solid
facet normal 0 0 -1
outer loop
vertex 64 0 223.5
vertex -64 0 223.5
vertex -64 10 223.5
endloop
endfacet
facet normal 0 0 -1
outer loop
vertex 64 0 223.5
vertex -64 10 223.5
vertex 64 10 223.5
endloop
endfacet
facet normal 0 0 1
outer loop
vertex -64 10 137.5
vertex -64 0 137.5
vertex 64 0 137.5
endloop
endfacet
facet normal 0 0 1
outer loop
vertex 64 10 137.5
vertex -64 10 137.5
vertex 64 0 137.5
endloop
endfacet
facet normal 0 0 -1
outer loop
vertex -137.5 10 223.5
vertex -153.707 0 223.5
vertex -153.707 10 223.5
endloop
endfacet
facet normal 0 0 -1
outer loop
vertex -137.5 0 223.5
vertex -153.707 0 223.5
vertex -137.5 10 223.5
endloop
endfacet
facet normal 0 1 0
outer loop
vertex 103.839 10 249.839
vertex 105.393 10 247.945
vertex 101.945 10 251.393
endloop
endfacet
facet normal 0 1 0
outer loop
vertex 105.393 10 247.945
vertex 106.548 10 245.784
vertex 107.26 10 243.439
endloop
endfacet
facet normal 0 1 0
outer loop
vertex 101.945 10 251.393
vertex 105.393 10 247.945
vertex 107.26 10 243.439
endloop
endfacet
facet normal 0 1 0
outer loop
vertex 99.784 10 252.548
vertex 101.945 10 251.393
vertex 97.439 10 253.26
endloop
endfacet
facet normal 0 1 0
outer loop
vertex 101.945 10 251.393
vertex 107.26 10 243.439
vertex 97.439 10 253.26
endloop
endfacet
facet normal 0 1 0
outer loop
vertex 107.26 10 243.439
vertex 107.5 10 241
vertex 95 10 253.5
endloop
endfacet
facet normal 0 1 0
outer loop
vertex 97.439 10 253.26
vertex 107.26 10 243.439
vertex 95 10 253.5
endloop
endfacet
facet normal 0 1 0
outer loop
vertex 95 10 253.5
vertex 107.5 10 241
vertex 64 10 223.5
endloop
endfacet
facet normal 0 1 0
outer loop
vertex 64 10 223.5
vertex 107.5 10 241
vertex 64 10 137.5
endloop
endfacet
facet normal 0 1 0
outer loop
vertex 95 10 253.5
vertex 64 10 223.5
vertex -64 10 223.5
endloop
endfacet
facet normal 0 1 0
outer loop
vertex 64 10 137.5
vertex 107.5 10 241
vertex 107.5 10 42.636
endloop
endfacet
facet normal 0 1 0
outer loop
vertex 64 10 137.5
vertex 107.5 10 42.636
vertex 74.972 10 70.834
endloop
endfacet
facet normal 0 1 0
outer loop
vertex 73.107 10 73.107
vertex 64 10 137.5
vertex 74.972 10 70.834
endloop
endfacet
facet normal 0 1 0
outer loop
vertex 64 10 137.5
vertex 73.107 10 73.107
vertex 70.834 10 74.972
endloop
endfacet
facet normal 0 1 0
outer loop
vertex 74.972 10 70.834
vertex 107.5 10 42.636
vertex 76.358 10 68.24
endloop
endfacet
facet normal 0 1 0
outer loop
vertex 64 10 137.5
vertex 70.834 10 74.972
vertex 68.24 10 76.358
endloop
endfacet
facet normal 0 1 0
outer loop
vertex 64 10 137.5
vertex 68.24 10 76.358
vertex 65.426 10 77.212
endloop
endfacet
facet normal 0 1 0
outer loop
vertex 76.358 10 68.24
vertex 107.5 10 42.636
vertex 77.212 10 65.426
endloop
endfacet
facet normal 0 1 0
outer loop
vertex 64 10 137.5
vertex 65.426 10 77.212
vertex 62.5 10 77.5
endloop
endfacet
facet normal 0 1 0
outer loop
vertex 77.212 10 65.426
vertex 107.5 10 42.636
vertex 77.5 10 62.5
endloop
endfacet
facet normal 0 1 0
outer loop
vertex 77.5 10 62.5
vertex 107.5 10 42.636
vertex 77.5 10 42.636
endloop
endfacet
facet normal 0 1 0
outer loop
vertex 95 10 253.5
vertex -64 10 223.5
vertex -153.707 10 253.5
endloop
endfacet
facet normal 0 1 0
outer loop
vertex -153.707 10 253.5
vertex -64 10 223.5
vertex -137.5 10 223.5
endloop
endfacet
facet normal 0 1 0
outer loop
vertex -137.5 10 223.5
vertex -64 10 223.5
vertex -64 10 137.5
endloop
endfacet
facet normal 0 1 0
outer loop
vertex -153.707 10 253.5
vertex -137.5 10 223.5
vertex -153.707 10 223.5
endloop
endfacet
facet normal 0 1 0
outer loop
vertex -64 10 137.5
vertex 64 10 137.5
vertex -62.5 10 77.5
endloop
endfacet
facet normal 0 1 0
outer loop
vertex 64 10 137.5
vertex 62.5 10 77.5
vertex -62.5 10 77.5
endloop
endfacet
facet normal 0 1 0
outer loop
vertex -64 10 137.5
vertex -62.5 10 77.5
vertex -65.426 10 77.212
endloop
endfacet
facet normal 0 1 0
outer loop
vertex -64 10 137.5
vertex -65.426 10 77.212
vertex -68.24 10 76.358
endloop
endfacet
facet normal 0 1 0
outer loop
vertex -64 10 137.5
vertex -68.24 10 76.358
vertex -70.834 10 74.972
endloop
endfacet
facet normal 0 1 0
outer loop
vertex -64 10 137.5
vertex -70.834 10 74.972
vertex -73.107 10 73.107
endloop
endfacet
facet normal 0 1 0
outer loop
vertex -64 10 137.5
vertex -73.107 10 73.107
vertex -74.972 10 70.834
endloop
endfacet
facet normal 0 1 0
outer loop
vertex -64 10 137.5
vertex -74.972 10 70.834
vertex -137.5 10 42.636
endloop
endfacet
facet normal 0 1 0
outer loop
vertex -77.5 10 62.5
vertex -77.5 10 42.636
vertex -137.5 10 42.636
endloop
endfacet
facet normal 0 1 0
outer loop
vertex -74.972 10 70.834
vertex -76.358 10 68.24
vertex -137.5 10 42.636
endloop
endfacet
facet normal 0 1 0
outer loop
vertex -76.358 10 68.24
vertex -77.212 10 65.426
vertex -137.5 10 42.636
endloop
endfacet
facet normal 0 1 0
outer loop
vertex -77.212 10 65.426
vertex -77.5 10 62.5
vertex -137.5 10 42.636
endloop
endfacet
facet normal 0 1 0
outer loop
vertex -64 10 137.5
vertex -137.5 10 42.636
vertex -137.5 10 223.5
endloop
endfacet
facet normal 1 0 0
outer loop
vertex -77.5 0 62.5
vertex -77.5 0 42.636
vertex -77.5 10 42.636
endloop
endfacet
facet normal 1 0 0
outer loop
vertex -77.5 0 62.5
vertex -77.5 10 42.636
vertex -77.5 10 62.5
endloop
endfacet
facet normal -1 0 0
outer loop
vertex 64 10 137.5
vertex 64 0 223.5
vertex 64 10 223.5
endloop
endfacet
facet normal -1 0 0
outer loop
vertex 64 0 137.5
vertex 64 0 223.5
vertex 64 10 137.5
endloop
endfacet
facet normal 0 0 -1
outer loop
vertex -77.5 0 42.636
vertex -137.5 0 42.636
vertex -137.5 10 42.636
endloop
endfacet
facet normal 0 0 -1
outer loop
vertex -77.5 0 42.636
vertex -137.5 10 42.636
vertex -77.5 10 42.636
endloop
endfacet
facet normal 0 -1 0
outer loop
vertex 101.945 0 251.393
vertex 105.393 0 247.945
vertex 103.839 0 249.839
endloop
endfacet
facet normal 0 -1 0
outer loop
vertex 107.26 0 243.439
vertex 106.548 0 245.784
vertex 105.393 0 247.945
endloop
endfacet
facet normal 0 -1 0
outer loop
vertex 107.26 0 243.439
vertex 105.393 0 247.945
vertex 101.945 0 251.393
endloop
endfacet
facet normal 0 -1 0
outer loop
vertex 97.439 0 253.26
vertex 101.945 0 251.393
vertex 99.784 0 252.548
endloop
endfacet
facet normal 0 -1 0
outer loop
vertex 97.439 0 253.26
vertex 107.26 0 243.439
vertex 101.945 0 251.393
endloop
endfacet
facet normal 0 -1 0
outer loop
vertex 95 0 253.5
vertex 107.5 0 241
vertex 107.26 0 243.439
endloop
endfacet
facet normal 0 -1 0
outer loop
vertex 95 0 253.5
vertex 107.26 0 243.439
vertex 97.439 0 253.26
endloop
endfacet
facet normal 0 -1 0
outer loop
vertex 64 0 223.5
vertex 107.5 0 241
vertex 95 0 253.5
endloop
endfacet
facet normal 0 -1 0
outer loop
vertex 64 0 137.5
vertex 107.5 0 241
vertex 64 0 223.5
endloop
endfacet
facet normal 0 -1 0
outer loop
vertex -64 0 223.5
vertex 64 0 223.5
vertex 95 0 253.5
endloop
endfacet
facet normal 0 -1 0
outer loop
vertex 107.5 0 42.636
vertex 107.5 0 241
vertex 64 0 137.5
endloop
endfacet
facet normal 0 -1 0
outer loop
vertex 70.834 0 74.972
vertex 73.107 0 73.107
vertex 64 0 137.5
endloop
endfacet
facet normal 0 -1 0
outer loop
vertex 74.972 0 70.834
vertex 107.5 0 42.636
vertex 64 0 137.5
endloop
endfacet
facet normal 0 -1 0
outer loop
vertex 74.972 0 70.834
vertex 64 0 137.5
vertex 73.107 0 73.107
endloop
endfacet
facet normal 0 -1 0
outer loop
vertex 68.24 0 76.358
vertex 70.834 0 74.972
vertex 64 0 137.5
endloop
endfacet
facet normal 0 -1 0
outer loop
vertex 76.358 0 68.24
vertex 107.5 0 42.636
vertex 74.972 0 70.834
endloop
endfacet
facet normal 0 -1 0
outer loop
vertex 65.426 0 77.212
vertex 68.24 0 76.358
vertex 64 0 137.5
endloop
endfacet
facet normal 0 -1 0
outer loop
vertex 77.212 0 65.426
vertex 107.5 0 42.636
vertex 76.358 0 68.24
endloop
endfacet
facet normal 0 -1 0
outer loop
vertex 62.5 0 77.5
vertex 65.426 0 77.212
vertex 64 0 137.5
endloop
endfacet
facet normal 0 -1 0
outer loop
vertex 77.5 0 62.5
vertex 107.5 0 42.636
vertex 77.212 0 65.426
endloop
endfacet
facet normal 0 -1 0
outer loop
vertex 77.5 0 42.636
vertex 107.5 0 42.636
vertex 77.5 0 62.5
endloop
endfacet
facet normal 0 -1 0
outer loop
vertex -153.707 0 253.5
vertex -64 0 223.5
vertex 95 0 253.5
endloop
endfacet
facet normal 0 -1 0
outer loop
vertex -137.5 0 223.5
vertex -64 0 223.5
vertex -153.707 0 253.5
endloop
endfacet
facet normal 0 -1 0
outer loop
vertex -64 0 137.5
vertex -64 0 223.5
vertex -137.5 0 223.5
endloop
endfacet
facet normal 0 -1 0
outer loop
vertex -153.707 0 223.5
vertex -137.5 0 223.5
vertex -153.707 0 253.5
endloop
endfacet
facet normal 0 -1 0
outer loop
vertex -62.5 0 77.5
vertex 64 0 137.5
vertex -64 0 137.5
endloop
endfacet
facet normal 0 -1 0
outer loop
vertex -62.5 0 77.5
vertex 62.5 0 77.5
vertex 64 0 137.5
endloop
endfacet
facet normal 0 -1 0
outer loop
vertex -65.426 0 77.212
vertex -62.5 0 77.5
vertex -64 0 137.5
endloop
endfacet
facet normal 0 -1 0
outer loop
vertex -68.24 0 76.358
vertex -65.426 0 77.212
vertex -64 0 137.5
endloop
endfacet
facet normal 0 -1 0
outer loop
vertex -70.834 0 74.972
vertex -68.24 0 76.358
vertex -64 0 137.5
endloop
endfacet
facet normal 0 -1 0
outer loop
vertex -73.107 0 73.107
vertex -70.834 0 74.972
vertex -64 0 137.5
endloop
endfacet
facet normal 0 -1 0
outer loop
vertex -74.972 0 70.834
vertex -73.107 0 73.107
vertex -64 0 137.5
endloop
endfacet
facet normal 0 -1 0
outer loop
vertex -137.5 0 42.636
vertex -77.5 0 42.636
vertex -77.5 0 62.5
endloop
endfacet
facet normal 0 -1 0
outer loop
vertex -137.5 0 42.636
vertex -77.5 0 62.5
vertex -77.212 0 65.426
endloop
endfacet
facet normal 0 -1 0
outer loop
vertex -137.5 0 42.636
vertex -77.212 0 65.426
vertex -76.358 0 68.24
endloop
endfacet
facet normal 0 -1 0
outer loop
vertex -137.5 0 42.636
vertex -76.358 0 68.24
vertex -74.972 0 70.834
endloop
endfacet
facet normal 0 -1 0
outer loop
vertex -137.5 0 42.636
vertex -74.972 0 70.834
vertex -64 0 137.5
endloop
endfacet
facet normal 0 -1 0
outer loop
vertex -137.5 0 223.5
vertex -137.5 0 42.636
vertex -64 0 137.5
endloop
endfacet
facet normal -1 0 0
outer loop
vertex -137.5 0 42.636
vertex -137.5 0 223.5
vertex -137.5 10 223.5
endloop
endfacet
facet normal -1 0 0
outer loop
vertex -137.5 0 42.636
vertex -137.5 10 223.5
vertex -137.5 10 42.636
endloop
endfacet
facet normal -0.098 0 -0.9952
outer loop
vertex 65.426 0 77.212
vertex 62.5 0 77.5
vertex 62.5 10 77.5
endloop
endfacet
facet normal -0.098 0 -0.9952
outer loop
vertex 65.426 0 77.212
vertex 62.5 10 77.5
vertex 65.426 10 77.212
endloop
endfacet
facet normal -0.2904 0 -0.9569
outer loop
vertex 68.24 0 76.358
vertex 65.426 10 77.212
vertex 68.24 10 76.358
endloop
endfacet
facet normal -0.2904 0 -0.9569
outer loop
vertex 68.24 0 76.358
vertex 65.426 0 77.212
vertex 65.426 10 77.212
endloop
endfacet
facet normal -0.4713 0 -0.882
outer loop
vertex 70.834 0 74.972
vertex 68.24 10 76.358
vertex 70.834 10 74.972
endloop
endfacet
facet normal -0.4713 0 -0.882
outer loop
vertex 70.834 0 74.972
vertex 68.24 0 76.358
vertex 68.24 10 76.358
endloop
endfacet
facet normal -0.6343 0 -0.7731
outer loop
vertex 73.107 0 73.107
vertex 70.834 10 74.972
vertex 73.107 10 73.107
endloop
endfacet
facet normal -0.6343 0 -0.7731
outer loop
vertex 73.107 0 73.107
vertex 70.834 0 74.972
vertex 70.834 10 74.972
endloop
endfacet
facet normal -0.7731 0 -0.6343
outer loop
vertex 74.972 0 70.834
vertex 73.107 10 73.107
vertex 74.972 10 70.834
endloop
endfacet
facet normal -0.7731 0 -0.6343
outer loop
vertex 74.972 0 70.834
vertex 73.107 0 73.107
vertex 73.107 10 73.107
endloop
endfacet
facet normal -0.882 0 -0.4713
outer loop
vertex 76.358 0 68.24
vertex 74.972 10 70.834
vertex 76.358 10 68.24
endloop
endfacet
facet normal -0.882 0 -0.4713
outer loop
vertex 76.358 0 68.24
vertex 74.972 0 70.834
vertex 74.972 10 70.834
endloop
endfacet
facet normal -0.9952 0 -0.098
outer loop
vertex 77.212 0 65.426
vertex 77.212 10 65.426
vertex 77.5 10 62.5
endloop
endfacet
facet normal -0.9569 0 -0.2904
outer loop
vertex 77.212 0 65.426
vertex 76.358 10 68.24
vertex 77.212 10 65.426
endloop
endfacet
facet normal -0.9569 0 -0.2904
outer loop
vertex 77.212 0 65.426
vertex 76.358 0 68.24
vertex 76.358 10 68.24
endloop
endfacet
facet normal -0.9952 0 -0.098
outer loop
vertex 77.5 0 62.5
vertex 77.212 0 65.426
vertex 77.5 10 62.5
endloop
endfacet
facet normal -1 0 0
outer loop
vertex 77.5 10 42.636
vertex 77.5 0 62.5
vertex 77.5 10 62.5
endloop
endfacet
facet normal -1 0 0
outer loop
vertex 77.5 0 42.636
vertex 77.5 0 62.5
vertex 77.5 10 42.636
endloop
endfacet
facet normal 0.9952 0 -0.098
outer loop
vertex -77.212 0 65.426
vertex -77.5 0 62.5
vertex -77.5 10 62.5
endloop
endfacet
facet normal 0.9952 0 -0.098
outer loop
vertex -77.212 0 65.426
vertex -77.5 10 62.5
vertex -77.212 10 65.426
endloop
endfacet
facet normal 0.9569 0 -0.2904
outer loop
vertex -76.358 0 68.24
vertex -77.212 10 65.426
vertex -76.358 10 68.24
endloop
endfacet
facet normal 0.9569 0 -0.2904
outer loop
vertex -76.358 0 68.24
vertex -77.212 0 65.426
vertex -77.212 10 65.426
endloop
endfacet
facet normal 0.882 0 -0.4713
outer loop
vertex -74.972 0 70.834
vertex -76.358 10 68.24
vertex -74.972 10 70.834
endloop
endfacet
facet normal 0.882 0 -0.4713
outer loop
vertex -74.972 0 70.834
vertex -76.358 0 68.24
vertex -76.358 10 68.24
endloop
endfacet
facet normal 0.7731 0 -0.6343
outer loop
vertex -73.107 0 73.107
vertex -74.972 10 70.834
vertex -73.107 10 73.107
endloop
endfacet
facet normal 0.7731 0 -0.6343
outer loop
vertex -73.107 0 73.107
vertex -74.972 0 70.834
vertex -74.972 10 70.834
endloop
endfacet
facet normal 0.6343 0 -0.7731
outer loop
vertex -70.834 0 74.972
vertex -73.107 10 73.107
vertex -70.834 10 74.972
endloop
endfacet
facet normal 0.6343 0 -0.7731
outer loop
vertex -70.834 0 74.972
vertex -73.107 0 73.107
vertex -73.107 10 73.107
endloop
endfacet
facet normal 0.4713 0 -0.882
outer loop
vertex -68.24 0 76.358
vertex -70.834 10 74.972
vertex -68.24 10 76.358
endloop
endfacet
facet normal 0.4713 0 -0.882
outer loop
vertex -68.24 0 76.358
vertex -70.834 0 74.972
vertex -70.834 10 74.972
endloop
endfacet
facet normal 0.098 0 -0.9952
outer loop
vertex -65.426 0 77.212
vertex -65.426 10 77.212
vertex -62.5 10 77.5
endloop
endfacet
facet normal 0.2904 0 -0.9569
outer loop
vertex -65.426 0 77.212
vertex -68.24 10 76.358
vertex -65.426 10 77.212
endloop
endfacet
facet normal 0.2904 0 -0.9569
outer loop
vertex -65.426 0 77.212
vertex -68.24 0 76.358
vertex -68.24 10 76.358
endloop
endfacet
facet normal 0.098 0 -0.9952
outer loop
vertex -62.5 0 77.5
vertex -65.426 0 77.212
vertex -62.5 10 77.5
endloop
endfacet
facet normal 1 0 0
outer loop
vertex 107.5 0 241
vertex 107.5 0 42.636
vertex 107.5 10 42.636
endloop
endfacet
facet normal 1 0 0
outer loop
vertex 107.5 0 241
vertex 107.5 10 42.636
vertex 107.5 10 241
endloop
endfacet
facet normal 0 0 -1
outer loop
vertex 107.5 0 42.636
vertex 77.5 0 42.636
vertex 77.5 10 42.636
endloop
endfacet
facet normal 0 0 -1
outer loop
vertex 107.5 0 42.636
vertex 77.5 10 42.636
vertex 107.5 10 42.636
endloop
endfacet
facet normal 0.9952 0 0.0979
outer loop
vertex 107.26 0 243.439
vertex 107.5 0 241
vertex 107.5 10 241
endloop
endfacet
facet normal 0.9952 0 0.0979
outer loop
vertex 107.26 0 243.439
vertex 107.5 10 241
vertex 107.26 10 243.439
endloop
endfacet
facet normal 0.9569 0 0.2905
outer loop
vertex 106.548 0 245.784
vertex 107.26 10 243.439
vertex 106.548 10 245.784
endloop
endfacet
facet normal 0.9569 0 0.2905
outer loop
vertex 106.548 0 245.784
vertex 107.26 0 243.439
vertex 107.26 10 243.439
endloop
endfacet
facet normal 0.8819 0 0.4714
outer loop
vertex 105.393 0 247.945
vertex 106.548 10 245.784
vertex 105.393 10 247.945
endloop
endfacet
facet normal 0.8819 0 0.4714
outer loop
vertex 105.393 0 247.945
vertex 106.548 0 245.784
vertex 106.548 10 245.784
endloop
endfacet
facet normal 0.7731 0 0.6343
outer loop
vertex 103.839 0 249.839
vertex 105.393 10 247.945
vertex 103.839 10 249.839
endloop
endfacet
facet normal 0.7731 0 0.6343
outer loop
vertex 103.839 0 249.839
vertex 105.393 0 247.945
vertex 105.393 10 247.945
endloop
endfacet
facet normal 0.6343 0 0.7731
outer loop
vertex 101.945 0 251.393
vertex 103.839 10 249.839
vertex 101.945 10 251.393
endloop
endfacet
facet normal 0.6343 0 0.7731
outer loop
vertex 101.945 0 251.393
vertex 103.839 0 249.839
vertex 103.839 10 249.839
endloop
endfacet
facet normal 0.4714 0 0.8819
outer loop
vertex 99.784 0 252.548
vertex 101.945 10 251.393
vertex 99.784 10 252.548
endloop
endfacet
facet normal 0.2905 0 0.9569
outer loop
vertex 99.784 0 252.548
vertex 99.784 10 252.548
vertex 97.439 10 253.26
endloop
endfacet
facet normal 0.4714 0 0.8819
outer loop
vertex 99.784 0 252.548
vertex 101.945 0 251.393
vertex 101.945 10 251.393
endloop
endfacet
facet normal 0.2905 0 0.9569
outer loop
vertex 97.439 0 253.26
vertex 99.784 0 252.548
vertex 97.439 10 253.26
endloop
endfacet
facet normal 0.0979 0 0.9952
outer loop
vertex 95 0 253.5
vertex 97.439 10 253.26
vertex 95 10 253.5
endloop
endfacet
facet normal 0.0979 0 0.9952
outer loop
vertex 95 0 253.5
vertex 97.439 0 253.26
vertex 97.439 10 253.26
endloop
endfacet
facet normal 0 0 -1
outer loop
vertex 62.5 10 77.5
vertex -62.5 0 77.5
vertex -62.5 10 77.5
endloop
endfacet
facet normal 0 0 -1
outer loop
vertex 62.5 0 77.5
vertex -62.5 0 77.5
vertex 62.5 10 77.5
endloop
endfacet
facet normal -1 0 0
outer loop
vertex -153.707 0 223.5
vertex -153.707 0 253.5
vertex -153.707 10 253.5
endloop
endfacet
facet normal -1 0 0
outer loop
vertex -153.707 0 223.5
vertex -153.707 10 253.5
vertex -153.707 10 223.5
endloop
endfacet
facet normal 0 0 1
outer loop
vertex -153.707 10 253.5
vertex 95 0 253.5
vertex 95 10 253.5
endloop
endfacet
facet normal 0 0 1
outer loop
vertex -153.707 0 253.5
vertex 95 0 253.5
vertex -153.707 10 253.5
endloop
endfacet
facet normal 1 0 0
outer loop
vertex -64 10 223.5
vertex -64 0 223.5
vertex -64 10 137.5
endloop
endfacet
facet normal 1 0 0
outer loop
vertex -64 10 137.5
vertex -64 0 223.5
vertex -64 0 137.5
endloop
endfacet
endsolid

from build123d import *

# Parameters (mm, degrees)
BOSS_EXTRUDE1_DEPTH = 10
SKETCH3_W           = 128
SKETCH3_H           = 86
SKETCH3_W_2         = 66
SKETCH3_H_2         = 212
CUT_EXTRUDE1_DEPTH  = 345.796316686
CUT_EXTRUDE2_DEPTH  = 345.796316686
SKETCH6_W           = 343.5
SKETCH6_H           = 159.021787697
CUT_EXTRUDE3_DEPTH  = 345.796316686
SKETCH7_W           = 86.89559668
SKETCH7_H           = 224.425885746
CUT_EXTRUDE4_DEPTH  = 345.796316686


with BuildPart() as part:
    # Sketch4 → Boss-Extrude1 (new body)
    with BuildSketch(Plane(origin=(0, 0, 0), x_dir=(1, 0, 0), z_dir=(0, 1, 0))):
        with BuildLine():
            Line((-221, 107.5), (95, 107.5))
            ThreePointArc((95, 107.5), (103.838834765, 103.838834765), (107.5, 95))
            Line((107.5, 95), (107.5, -241))
            ThreePointArc((107.5, -241), (103.838834765, -249.838834765), (95, -253.5))
            Line((95, -253.5), (-221, -253.5))
            ThreePointArc((-221, -253.5), (-229.838834765, -249.838834765), (-233.5, -241))
            Line((-233.5, -241), (-233.5, 95))
            ThreePointArc((-233.5, 95), (-229.838834765, 103.838834765), (-221, 107.5))
        make_face()
    extrude(amount=BOSS_EXTRUDE1_DEPTH)

    # Sketch3 → Cut-Extrude1 (cut, through all)
    with BuildSketch(Plane(origin=(0, 0, 0), x_dir=(1, 0, 0), z_dir=(0, 1, 0))):
        with Locations((0, -180.5)):
            Rectangle(SKETCH3_W, SKETCH3_H)
        with Locations((-170.5, -117.5)):
            Rectangle(SKETCH3_W_2, SKETCH3_H_2)
    extrude(amount=CUT_EXTRUDE1_DEPTH, mode=Mode.SUBTRACT)

    # Sketch1 → Cut-Extrude2 (cut, through all)
    with BuildSketch(Plane(origin=(0, 0, 0), x_dir=(1, 0, 0), z_dir=(0, 1, 0))):
        with BuildLine():
            Line((-62.5, -77.5), (62.5, -77.5))
            ThreePointArc((62.5, -77.5), (73.106601718, -73.106601718), (77.5, -62.5))
            Line((77.5, -62.5), (77.5, 62.5))
            ThreePointArc((77.5, 62.5), (73.106601718, 73.106601718), (62.5, 77.5))
            Line((62.5, 77.5), (-62.5, 77.5))
            ThreePointArc((-62.5, 77.5), (-73.106601718, 73.106601718), (-77.5, 62.5))
            Line((-77.5, 62.5), (-77.5, -62.5))
            ThreePointArc((-77.5, -62.5), (-73.106601718, -73.106601718), (-62.5, -77.5))
        make_face()
    extrude(amount=CUT_EXTRUDE2_DEPTH, mode=Mode.SUBTRACT)

    # Sketch6 → Cut-Extrude3 (cut, through all)
    with BuildSketch(Plane(origin=(0, 0, 0), x_dir=(1, 0, 0), z_dir=(0, 1, 0))):
        with Locations((-61.75, 36.875290319)):
            Rectangle(SKETCH6_W, SKETCH6_H)
    extrude(amount=CUT_EXTRUDE3_DEPTH, mode=Mode.SUBTRACT)

    # Sketch7 → Cut-Extrude4 (cut, through all)
    with BuildSketch(Plane(origin=(0, 0, 0), x_dir=(1, 0, 0), z_dir=(0, 1, 0))):
        with Locations((-197.154605401, -141.287057127)):
            Rectangle(SKETCH7_W, SKETCH7_H)
    extrude(amount=CUT_EXTRUDE4_DEPTH, mode=Mode.SUBTRACT)


solid = part.part
